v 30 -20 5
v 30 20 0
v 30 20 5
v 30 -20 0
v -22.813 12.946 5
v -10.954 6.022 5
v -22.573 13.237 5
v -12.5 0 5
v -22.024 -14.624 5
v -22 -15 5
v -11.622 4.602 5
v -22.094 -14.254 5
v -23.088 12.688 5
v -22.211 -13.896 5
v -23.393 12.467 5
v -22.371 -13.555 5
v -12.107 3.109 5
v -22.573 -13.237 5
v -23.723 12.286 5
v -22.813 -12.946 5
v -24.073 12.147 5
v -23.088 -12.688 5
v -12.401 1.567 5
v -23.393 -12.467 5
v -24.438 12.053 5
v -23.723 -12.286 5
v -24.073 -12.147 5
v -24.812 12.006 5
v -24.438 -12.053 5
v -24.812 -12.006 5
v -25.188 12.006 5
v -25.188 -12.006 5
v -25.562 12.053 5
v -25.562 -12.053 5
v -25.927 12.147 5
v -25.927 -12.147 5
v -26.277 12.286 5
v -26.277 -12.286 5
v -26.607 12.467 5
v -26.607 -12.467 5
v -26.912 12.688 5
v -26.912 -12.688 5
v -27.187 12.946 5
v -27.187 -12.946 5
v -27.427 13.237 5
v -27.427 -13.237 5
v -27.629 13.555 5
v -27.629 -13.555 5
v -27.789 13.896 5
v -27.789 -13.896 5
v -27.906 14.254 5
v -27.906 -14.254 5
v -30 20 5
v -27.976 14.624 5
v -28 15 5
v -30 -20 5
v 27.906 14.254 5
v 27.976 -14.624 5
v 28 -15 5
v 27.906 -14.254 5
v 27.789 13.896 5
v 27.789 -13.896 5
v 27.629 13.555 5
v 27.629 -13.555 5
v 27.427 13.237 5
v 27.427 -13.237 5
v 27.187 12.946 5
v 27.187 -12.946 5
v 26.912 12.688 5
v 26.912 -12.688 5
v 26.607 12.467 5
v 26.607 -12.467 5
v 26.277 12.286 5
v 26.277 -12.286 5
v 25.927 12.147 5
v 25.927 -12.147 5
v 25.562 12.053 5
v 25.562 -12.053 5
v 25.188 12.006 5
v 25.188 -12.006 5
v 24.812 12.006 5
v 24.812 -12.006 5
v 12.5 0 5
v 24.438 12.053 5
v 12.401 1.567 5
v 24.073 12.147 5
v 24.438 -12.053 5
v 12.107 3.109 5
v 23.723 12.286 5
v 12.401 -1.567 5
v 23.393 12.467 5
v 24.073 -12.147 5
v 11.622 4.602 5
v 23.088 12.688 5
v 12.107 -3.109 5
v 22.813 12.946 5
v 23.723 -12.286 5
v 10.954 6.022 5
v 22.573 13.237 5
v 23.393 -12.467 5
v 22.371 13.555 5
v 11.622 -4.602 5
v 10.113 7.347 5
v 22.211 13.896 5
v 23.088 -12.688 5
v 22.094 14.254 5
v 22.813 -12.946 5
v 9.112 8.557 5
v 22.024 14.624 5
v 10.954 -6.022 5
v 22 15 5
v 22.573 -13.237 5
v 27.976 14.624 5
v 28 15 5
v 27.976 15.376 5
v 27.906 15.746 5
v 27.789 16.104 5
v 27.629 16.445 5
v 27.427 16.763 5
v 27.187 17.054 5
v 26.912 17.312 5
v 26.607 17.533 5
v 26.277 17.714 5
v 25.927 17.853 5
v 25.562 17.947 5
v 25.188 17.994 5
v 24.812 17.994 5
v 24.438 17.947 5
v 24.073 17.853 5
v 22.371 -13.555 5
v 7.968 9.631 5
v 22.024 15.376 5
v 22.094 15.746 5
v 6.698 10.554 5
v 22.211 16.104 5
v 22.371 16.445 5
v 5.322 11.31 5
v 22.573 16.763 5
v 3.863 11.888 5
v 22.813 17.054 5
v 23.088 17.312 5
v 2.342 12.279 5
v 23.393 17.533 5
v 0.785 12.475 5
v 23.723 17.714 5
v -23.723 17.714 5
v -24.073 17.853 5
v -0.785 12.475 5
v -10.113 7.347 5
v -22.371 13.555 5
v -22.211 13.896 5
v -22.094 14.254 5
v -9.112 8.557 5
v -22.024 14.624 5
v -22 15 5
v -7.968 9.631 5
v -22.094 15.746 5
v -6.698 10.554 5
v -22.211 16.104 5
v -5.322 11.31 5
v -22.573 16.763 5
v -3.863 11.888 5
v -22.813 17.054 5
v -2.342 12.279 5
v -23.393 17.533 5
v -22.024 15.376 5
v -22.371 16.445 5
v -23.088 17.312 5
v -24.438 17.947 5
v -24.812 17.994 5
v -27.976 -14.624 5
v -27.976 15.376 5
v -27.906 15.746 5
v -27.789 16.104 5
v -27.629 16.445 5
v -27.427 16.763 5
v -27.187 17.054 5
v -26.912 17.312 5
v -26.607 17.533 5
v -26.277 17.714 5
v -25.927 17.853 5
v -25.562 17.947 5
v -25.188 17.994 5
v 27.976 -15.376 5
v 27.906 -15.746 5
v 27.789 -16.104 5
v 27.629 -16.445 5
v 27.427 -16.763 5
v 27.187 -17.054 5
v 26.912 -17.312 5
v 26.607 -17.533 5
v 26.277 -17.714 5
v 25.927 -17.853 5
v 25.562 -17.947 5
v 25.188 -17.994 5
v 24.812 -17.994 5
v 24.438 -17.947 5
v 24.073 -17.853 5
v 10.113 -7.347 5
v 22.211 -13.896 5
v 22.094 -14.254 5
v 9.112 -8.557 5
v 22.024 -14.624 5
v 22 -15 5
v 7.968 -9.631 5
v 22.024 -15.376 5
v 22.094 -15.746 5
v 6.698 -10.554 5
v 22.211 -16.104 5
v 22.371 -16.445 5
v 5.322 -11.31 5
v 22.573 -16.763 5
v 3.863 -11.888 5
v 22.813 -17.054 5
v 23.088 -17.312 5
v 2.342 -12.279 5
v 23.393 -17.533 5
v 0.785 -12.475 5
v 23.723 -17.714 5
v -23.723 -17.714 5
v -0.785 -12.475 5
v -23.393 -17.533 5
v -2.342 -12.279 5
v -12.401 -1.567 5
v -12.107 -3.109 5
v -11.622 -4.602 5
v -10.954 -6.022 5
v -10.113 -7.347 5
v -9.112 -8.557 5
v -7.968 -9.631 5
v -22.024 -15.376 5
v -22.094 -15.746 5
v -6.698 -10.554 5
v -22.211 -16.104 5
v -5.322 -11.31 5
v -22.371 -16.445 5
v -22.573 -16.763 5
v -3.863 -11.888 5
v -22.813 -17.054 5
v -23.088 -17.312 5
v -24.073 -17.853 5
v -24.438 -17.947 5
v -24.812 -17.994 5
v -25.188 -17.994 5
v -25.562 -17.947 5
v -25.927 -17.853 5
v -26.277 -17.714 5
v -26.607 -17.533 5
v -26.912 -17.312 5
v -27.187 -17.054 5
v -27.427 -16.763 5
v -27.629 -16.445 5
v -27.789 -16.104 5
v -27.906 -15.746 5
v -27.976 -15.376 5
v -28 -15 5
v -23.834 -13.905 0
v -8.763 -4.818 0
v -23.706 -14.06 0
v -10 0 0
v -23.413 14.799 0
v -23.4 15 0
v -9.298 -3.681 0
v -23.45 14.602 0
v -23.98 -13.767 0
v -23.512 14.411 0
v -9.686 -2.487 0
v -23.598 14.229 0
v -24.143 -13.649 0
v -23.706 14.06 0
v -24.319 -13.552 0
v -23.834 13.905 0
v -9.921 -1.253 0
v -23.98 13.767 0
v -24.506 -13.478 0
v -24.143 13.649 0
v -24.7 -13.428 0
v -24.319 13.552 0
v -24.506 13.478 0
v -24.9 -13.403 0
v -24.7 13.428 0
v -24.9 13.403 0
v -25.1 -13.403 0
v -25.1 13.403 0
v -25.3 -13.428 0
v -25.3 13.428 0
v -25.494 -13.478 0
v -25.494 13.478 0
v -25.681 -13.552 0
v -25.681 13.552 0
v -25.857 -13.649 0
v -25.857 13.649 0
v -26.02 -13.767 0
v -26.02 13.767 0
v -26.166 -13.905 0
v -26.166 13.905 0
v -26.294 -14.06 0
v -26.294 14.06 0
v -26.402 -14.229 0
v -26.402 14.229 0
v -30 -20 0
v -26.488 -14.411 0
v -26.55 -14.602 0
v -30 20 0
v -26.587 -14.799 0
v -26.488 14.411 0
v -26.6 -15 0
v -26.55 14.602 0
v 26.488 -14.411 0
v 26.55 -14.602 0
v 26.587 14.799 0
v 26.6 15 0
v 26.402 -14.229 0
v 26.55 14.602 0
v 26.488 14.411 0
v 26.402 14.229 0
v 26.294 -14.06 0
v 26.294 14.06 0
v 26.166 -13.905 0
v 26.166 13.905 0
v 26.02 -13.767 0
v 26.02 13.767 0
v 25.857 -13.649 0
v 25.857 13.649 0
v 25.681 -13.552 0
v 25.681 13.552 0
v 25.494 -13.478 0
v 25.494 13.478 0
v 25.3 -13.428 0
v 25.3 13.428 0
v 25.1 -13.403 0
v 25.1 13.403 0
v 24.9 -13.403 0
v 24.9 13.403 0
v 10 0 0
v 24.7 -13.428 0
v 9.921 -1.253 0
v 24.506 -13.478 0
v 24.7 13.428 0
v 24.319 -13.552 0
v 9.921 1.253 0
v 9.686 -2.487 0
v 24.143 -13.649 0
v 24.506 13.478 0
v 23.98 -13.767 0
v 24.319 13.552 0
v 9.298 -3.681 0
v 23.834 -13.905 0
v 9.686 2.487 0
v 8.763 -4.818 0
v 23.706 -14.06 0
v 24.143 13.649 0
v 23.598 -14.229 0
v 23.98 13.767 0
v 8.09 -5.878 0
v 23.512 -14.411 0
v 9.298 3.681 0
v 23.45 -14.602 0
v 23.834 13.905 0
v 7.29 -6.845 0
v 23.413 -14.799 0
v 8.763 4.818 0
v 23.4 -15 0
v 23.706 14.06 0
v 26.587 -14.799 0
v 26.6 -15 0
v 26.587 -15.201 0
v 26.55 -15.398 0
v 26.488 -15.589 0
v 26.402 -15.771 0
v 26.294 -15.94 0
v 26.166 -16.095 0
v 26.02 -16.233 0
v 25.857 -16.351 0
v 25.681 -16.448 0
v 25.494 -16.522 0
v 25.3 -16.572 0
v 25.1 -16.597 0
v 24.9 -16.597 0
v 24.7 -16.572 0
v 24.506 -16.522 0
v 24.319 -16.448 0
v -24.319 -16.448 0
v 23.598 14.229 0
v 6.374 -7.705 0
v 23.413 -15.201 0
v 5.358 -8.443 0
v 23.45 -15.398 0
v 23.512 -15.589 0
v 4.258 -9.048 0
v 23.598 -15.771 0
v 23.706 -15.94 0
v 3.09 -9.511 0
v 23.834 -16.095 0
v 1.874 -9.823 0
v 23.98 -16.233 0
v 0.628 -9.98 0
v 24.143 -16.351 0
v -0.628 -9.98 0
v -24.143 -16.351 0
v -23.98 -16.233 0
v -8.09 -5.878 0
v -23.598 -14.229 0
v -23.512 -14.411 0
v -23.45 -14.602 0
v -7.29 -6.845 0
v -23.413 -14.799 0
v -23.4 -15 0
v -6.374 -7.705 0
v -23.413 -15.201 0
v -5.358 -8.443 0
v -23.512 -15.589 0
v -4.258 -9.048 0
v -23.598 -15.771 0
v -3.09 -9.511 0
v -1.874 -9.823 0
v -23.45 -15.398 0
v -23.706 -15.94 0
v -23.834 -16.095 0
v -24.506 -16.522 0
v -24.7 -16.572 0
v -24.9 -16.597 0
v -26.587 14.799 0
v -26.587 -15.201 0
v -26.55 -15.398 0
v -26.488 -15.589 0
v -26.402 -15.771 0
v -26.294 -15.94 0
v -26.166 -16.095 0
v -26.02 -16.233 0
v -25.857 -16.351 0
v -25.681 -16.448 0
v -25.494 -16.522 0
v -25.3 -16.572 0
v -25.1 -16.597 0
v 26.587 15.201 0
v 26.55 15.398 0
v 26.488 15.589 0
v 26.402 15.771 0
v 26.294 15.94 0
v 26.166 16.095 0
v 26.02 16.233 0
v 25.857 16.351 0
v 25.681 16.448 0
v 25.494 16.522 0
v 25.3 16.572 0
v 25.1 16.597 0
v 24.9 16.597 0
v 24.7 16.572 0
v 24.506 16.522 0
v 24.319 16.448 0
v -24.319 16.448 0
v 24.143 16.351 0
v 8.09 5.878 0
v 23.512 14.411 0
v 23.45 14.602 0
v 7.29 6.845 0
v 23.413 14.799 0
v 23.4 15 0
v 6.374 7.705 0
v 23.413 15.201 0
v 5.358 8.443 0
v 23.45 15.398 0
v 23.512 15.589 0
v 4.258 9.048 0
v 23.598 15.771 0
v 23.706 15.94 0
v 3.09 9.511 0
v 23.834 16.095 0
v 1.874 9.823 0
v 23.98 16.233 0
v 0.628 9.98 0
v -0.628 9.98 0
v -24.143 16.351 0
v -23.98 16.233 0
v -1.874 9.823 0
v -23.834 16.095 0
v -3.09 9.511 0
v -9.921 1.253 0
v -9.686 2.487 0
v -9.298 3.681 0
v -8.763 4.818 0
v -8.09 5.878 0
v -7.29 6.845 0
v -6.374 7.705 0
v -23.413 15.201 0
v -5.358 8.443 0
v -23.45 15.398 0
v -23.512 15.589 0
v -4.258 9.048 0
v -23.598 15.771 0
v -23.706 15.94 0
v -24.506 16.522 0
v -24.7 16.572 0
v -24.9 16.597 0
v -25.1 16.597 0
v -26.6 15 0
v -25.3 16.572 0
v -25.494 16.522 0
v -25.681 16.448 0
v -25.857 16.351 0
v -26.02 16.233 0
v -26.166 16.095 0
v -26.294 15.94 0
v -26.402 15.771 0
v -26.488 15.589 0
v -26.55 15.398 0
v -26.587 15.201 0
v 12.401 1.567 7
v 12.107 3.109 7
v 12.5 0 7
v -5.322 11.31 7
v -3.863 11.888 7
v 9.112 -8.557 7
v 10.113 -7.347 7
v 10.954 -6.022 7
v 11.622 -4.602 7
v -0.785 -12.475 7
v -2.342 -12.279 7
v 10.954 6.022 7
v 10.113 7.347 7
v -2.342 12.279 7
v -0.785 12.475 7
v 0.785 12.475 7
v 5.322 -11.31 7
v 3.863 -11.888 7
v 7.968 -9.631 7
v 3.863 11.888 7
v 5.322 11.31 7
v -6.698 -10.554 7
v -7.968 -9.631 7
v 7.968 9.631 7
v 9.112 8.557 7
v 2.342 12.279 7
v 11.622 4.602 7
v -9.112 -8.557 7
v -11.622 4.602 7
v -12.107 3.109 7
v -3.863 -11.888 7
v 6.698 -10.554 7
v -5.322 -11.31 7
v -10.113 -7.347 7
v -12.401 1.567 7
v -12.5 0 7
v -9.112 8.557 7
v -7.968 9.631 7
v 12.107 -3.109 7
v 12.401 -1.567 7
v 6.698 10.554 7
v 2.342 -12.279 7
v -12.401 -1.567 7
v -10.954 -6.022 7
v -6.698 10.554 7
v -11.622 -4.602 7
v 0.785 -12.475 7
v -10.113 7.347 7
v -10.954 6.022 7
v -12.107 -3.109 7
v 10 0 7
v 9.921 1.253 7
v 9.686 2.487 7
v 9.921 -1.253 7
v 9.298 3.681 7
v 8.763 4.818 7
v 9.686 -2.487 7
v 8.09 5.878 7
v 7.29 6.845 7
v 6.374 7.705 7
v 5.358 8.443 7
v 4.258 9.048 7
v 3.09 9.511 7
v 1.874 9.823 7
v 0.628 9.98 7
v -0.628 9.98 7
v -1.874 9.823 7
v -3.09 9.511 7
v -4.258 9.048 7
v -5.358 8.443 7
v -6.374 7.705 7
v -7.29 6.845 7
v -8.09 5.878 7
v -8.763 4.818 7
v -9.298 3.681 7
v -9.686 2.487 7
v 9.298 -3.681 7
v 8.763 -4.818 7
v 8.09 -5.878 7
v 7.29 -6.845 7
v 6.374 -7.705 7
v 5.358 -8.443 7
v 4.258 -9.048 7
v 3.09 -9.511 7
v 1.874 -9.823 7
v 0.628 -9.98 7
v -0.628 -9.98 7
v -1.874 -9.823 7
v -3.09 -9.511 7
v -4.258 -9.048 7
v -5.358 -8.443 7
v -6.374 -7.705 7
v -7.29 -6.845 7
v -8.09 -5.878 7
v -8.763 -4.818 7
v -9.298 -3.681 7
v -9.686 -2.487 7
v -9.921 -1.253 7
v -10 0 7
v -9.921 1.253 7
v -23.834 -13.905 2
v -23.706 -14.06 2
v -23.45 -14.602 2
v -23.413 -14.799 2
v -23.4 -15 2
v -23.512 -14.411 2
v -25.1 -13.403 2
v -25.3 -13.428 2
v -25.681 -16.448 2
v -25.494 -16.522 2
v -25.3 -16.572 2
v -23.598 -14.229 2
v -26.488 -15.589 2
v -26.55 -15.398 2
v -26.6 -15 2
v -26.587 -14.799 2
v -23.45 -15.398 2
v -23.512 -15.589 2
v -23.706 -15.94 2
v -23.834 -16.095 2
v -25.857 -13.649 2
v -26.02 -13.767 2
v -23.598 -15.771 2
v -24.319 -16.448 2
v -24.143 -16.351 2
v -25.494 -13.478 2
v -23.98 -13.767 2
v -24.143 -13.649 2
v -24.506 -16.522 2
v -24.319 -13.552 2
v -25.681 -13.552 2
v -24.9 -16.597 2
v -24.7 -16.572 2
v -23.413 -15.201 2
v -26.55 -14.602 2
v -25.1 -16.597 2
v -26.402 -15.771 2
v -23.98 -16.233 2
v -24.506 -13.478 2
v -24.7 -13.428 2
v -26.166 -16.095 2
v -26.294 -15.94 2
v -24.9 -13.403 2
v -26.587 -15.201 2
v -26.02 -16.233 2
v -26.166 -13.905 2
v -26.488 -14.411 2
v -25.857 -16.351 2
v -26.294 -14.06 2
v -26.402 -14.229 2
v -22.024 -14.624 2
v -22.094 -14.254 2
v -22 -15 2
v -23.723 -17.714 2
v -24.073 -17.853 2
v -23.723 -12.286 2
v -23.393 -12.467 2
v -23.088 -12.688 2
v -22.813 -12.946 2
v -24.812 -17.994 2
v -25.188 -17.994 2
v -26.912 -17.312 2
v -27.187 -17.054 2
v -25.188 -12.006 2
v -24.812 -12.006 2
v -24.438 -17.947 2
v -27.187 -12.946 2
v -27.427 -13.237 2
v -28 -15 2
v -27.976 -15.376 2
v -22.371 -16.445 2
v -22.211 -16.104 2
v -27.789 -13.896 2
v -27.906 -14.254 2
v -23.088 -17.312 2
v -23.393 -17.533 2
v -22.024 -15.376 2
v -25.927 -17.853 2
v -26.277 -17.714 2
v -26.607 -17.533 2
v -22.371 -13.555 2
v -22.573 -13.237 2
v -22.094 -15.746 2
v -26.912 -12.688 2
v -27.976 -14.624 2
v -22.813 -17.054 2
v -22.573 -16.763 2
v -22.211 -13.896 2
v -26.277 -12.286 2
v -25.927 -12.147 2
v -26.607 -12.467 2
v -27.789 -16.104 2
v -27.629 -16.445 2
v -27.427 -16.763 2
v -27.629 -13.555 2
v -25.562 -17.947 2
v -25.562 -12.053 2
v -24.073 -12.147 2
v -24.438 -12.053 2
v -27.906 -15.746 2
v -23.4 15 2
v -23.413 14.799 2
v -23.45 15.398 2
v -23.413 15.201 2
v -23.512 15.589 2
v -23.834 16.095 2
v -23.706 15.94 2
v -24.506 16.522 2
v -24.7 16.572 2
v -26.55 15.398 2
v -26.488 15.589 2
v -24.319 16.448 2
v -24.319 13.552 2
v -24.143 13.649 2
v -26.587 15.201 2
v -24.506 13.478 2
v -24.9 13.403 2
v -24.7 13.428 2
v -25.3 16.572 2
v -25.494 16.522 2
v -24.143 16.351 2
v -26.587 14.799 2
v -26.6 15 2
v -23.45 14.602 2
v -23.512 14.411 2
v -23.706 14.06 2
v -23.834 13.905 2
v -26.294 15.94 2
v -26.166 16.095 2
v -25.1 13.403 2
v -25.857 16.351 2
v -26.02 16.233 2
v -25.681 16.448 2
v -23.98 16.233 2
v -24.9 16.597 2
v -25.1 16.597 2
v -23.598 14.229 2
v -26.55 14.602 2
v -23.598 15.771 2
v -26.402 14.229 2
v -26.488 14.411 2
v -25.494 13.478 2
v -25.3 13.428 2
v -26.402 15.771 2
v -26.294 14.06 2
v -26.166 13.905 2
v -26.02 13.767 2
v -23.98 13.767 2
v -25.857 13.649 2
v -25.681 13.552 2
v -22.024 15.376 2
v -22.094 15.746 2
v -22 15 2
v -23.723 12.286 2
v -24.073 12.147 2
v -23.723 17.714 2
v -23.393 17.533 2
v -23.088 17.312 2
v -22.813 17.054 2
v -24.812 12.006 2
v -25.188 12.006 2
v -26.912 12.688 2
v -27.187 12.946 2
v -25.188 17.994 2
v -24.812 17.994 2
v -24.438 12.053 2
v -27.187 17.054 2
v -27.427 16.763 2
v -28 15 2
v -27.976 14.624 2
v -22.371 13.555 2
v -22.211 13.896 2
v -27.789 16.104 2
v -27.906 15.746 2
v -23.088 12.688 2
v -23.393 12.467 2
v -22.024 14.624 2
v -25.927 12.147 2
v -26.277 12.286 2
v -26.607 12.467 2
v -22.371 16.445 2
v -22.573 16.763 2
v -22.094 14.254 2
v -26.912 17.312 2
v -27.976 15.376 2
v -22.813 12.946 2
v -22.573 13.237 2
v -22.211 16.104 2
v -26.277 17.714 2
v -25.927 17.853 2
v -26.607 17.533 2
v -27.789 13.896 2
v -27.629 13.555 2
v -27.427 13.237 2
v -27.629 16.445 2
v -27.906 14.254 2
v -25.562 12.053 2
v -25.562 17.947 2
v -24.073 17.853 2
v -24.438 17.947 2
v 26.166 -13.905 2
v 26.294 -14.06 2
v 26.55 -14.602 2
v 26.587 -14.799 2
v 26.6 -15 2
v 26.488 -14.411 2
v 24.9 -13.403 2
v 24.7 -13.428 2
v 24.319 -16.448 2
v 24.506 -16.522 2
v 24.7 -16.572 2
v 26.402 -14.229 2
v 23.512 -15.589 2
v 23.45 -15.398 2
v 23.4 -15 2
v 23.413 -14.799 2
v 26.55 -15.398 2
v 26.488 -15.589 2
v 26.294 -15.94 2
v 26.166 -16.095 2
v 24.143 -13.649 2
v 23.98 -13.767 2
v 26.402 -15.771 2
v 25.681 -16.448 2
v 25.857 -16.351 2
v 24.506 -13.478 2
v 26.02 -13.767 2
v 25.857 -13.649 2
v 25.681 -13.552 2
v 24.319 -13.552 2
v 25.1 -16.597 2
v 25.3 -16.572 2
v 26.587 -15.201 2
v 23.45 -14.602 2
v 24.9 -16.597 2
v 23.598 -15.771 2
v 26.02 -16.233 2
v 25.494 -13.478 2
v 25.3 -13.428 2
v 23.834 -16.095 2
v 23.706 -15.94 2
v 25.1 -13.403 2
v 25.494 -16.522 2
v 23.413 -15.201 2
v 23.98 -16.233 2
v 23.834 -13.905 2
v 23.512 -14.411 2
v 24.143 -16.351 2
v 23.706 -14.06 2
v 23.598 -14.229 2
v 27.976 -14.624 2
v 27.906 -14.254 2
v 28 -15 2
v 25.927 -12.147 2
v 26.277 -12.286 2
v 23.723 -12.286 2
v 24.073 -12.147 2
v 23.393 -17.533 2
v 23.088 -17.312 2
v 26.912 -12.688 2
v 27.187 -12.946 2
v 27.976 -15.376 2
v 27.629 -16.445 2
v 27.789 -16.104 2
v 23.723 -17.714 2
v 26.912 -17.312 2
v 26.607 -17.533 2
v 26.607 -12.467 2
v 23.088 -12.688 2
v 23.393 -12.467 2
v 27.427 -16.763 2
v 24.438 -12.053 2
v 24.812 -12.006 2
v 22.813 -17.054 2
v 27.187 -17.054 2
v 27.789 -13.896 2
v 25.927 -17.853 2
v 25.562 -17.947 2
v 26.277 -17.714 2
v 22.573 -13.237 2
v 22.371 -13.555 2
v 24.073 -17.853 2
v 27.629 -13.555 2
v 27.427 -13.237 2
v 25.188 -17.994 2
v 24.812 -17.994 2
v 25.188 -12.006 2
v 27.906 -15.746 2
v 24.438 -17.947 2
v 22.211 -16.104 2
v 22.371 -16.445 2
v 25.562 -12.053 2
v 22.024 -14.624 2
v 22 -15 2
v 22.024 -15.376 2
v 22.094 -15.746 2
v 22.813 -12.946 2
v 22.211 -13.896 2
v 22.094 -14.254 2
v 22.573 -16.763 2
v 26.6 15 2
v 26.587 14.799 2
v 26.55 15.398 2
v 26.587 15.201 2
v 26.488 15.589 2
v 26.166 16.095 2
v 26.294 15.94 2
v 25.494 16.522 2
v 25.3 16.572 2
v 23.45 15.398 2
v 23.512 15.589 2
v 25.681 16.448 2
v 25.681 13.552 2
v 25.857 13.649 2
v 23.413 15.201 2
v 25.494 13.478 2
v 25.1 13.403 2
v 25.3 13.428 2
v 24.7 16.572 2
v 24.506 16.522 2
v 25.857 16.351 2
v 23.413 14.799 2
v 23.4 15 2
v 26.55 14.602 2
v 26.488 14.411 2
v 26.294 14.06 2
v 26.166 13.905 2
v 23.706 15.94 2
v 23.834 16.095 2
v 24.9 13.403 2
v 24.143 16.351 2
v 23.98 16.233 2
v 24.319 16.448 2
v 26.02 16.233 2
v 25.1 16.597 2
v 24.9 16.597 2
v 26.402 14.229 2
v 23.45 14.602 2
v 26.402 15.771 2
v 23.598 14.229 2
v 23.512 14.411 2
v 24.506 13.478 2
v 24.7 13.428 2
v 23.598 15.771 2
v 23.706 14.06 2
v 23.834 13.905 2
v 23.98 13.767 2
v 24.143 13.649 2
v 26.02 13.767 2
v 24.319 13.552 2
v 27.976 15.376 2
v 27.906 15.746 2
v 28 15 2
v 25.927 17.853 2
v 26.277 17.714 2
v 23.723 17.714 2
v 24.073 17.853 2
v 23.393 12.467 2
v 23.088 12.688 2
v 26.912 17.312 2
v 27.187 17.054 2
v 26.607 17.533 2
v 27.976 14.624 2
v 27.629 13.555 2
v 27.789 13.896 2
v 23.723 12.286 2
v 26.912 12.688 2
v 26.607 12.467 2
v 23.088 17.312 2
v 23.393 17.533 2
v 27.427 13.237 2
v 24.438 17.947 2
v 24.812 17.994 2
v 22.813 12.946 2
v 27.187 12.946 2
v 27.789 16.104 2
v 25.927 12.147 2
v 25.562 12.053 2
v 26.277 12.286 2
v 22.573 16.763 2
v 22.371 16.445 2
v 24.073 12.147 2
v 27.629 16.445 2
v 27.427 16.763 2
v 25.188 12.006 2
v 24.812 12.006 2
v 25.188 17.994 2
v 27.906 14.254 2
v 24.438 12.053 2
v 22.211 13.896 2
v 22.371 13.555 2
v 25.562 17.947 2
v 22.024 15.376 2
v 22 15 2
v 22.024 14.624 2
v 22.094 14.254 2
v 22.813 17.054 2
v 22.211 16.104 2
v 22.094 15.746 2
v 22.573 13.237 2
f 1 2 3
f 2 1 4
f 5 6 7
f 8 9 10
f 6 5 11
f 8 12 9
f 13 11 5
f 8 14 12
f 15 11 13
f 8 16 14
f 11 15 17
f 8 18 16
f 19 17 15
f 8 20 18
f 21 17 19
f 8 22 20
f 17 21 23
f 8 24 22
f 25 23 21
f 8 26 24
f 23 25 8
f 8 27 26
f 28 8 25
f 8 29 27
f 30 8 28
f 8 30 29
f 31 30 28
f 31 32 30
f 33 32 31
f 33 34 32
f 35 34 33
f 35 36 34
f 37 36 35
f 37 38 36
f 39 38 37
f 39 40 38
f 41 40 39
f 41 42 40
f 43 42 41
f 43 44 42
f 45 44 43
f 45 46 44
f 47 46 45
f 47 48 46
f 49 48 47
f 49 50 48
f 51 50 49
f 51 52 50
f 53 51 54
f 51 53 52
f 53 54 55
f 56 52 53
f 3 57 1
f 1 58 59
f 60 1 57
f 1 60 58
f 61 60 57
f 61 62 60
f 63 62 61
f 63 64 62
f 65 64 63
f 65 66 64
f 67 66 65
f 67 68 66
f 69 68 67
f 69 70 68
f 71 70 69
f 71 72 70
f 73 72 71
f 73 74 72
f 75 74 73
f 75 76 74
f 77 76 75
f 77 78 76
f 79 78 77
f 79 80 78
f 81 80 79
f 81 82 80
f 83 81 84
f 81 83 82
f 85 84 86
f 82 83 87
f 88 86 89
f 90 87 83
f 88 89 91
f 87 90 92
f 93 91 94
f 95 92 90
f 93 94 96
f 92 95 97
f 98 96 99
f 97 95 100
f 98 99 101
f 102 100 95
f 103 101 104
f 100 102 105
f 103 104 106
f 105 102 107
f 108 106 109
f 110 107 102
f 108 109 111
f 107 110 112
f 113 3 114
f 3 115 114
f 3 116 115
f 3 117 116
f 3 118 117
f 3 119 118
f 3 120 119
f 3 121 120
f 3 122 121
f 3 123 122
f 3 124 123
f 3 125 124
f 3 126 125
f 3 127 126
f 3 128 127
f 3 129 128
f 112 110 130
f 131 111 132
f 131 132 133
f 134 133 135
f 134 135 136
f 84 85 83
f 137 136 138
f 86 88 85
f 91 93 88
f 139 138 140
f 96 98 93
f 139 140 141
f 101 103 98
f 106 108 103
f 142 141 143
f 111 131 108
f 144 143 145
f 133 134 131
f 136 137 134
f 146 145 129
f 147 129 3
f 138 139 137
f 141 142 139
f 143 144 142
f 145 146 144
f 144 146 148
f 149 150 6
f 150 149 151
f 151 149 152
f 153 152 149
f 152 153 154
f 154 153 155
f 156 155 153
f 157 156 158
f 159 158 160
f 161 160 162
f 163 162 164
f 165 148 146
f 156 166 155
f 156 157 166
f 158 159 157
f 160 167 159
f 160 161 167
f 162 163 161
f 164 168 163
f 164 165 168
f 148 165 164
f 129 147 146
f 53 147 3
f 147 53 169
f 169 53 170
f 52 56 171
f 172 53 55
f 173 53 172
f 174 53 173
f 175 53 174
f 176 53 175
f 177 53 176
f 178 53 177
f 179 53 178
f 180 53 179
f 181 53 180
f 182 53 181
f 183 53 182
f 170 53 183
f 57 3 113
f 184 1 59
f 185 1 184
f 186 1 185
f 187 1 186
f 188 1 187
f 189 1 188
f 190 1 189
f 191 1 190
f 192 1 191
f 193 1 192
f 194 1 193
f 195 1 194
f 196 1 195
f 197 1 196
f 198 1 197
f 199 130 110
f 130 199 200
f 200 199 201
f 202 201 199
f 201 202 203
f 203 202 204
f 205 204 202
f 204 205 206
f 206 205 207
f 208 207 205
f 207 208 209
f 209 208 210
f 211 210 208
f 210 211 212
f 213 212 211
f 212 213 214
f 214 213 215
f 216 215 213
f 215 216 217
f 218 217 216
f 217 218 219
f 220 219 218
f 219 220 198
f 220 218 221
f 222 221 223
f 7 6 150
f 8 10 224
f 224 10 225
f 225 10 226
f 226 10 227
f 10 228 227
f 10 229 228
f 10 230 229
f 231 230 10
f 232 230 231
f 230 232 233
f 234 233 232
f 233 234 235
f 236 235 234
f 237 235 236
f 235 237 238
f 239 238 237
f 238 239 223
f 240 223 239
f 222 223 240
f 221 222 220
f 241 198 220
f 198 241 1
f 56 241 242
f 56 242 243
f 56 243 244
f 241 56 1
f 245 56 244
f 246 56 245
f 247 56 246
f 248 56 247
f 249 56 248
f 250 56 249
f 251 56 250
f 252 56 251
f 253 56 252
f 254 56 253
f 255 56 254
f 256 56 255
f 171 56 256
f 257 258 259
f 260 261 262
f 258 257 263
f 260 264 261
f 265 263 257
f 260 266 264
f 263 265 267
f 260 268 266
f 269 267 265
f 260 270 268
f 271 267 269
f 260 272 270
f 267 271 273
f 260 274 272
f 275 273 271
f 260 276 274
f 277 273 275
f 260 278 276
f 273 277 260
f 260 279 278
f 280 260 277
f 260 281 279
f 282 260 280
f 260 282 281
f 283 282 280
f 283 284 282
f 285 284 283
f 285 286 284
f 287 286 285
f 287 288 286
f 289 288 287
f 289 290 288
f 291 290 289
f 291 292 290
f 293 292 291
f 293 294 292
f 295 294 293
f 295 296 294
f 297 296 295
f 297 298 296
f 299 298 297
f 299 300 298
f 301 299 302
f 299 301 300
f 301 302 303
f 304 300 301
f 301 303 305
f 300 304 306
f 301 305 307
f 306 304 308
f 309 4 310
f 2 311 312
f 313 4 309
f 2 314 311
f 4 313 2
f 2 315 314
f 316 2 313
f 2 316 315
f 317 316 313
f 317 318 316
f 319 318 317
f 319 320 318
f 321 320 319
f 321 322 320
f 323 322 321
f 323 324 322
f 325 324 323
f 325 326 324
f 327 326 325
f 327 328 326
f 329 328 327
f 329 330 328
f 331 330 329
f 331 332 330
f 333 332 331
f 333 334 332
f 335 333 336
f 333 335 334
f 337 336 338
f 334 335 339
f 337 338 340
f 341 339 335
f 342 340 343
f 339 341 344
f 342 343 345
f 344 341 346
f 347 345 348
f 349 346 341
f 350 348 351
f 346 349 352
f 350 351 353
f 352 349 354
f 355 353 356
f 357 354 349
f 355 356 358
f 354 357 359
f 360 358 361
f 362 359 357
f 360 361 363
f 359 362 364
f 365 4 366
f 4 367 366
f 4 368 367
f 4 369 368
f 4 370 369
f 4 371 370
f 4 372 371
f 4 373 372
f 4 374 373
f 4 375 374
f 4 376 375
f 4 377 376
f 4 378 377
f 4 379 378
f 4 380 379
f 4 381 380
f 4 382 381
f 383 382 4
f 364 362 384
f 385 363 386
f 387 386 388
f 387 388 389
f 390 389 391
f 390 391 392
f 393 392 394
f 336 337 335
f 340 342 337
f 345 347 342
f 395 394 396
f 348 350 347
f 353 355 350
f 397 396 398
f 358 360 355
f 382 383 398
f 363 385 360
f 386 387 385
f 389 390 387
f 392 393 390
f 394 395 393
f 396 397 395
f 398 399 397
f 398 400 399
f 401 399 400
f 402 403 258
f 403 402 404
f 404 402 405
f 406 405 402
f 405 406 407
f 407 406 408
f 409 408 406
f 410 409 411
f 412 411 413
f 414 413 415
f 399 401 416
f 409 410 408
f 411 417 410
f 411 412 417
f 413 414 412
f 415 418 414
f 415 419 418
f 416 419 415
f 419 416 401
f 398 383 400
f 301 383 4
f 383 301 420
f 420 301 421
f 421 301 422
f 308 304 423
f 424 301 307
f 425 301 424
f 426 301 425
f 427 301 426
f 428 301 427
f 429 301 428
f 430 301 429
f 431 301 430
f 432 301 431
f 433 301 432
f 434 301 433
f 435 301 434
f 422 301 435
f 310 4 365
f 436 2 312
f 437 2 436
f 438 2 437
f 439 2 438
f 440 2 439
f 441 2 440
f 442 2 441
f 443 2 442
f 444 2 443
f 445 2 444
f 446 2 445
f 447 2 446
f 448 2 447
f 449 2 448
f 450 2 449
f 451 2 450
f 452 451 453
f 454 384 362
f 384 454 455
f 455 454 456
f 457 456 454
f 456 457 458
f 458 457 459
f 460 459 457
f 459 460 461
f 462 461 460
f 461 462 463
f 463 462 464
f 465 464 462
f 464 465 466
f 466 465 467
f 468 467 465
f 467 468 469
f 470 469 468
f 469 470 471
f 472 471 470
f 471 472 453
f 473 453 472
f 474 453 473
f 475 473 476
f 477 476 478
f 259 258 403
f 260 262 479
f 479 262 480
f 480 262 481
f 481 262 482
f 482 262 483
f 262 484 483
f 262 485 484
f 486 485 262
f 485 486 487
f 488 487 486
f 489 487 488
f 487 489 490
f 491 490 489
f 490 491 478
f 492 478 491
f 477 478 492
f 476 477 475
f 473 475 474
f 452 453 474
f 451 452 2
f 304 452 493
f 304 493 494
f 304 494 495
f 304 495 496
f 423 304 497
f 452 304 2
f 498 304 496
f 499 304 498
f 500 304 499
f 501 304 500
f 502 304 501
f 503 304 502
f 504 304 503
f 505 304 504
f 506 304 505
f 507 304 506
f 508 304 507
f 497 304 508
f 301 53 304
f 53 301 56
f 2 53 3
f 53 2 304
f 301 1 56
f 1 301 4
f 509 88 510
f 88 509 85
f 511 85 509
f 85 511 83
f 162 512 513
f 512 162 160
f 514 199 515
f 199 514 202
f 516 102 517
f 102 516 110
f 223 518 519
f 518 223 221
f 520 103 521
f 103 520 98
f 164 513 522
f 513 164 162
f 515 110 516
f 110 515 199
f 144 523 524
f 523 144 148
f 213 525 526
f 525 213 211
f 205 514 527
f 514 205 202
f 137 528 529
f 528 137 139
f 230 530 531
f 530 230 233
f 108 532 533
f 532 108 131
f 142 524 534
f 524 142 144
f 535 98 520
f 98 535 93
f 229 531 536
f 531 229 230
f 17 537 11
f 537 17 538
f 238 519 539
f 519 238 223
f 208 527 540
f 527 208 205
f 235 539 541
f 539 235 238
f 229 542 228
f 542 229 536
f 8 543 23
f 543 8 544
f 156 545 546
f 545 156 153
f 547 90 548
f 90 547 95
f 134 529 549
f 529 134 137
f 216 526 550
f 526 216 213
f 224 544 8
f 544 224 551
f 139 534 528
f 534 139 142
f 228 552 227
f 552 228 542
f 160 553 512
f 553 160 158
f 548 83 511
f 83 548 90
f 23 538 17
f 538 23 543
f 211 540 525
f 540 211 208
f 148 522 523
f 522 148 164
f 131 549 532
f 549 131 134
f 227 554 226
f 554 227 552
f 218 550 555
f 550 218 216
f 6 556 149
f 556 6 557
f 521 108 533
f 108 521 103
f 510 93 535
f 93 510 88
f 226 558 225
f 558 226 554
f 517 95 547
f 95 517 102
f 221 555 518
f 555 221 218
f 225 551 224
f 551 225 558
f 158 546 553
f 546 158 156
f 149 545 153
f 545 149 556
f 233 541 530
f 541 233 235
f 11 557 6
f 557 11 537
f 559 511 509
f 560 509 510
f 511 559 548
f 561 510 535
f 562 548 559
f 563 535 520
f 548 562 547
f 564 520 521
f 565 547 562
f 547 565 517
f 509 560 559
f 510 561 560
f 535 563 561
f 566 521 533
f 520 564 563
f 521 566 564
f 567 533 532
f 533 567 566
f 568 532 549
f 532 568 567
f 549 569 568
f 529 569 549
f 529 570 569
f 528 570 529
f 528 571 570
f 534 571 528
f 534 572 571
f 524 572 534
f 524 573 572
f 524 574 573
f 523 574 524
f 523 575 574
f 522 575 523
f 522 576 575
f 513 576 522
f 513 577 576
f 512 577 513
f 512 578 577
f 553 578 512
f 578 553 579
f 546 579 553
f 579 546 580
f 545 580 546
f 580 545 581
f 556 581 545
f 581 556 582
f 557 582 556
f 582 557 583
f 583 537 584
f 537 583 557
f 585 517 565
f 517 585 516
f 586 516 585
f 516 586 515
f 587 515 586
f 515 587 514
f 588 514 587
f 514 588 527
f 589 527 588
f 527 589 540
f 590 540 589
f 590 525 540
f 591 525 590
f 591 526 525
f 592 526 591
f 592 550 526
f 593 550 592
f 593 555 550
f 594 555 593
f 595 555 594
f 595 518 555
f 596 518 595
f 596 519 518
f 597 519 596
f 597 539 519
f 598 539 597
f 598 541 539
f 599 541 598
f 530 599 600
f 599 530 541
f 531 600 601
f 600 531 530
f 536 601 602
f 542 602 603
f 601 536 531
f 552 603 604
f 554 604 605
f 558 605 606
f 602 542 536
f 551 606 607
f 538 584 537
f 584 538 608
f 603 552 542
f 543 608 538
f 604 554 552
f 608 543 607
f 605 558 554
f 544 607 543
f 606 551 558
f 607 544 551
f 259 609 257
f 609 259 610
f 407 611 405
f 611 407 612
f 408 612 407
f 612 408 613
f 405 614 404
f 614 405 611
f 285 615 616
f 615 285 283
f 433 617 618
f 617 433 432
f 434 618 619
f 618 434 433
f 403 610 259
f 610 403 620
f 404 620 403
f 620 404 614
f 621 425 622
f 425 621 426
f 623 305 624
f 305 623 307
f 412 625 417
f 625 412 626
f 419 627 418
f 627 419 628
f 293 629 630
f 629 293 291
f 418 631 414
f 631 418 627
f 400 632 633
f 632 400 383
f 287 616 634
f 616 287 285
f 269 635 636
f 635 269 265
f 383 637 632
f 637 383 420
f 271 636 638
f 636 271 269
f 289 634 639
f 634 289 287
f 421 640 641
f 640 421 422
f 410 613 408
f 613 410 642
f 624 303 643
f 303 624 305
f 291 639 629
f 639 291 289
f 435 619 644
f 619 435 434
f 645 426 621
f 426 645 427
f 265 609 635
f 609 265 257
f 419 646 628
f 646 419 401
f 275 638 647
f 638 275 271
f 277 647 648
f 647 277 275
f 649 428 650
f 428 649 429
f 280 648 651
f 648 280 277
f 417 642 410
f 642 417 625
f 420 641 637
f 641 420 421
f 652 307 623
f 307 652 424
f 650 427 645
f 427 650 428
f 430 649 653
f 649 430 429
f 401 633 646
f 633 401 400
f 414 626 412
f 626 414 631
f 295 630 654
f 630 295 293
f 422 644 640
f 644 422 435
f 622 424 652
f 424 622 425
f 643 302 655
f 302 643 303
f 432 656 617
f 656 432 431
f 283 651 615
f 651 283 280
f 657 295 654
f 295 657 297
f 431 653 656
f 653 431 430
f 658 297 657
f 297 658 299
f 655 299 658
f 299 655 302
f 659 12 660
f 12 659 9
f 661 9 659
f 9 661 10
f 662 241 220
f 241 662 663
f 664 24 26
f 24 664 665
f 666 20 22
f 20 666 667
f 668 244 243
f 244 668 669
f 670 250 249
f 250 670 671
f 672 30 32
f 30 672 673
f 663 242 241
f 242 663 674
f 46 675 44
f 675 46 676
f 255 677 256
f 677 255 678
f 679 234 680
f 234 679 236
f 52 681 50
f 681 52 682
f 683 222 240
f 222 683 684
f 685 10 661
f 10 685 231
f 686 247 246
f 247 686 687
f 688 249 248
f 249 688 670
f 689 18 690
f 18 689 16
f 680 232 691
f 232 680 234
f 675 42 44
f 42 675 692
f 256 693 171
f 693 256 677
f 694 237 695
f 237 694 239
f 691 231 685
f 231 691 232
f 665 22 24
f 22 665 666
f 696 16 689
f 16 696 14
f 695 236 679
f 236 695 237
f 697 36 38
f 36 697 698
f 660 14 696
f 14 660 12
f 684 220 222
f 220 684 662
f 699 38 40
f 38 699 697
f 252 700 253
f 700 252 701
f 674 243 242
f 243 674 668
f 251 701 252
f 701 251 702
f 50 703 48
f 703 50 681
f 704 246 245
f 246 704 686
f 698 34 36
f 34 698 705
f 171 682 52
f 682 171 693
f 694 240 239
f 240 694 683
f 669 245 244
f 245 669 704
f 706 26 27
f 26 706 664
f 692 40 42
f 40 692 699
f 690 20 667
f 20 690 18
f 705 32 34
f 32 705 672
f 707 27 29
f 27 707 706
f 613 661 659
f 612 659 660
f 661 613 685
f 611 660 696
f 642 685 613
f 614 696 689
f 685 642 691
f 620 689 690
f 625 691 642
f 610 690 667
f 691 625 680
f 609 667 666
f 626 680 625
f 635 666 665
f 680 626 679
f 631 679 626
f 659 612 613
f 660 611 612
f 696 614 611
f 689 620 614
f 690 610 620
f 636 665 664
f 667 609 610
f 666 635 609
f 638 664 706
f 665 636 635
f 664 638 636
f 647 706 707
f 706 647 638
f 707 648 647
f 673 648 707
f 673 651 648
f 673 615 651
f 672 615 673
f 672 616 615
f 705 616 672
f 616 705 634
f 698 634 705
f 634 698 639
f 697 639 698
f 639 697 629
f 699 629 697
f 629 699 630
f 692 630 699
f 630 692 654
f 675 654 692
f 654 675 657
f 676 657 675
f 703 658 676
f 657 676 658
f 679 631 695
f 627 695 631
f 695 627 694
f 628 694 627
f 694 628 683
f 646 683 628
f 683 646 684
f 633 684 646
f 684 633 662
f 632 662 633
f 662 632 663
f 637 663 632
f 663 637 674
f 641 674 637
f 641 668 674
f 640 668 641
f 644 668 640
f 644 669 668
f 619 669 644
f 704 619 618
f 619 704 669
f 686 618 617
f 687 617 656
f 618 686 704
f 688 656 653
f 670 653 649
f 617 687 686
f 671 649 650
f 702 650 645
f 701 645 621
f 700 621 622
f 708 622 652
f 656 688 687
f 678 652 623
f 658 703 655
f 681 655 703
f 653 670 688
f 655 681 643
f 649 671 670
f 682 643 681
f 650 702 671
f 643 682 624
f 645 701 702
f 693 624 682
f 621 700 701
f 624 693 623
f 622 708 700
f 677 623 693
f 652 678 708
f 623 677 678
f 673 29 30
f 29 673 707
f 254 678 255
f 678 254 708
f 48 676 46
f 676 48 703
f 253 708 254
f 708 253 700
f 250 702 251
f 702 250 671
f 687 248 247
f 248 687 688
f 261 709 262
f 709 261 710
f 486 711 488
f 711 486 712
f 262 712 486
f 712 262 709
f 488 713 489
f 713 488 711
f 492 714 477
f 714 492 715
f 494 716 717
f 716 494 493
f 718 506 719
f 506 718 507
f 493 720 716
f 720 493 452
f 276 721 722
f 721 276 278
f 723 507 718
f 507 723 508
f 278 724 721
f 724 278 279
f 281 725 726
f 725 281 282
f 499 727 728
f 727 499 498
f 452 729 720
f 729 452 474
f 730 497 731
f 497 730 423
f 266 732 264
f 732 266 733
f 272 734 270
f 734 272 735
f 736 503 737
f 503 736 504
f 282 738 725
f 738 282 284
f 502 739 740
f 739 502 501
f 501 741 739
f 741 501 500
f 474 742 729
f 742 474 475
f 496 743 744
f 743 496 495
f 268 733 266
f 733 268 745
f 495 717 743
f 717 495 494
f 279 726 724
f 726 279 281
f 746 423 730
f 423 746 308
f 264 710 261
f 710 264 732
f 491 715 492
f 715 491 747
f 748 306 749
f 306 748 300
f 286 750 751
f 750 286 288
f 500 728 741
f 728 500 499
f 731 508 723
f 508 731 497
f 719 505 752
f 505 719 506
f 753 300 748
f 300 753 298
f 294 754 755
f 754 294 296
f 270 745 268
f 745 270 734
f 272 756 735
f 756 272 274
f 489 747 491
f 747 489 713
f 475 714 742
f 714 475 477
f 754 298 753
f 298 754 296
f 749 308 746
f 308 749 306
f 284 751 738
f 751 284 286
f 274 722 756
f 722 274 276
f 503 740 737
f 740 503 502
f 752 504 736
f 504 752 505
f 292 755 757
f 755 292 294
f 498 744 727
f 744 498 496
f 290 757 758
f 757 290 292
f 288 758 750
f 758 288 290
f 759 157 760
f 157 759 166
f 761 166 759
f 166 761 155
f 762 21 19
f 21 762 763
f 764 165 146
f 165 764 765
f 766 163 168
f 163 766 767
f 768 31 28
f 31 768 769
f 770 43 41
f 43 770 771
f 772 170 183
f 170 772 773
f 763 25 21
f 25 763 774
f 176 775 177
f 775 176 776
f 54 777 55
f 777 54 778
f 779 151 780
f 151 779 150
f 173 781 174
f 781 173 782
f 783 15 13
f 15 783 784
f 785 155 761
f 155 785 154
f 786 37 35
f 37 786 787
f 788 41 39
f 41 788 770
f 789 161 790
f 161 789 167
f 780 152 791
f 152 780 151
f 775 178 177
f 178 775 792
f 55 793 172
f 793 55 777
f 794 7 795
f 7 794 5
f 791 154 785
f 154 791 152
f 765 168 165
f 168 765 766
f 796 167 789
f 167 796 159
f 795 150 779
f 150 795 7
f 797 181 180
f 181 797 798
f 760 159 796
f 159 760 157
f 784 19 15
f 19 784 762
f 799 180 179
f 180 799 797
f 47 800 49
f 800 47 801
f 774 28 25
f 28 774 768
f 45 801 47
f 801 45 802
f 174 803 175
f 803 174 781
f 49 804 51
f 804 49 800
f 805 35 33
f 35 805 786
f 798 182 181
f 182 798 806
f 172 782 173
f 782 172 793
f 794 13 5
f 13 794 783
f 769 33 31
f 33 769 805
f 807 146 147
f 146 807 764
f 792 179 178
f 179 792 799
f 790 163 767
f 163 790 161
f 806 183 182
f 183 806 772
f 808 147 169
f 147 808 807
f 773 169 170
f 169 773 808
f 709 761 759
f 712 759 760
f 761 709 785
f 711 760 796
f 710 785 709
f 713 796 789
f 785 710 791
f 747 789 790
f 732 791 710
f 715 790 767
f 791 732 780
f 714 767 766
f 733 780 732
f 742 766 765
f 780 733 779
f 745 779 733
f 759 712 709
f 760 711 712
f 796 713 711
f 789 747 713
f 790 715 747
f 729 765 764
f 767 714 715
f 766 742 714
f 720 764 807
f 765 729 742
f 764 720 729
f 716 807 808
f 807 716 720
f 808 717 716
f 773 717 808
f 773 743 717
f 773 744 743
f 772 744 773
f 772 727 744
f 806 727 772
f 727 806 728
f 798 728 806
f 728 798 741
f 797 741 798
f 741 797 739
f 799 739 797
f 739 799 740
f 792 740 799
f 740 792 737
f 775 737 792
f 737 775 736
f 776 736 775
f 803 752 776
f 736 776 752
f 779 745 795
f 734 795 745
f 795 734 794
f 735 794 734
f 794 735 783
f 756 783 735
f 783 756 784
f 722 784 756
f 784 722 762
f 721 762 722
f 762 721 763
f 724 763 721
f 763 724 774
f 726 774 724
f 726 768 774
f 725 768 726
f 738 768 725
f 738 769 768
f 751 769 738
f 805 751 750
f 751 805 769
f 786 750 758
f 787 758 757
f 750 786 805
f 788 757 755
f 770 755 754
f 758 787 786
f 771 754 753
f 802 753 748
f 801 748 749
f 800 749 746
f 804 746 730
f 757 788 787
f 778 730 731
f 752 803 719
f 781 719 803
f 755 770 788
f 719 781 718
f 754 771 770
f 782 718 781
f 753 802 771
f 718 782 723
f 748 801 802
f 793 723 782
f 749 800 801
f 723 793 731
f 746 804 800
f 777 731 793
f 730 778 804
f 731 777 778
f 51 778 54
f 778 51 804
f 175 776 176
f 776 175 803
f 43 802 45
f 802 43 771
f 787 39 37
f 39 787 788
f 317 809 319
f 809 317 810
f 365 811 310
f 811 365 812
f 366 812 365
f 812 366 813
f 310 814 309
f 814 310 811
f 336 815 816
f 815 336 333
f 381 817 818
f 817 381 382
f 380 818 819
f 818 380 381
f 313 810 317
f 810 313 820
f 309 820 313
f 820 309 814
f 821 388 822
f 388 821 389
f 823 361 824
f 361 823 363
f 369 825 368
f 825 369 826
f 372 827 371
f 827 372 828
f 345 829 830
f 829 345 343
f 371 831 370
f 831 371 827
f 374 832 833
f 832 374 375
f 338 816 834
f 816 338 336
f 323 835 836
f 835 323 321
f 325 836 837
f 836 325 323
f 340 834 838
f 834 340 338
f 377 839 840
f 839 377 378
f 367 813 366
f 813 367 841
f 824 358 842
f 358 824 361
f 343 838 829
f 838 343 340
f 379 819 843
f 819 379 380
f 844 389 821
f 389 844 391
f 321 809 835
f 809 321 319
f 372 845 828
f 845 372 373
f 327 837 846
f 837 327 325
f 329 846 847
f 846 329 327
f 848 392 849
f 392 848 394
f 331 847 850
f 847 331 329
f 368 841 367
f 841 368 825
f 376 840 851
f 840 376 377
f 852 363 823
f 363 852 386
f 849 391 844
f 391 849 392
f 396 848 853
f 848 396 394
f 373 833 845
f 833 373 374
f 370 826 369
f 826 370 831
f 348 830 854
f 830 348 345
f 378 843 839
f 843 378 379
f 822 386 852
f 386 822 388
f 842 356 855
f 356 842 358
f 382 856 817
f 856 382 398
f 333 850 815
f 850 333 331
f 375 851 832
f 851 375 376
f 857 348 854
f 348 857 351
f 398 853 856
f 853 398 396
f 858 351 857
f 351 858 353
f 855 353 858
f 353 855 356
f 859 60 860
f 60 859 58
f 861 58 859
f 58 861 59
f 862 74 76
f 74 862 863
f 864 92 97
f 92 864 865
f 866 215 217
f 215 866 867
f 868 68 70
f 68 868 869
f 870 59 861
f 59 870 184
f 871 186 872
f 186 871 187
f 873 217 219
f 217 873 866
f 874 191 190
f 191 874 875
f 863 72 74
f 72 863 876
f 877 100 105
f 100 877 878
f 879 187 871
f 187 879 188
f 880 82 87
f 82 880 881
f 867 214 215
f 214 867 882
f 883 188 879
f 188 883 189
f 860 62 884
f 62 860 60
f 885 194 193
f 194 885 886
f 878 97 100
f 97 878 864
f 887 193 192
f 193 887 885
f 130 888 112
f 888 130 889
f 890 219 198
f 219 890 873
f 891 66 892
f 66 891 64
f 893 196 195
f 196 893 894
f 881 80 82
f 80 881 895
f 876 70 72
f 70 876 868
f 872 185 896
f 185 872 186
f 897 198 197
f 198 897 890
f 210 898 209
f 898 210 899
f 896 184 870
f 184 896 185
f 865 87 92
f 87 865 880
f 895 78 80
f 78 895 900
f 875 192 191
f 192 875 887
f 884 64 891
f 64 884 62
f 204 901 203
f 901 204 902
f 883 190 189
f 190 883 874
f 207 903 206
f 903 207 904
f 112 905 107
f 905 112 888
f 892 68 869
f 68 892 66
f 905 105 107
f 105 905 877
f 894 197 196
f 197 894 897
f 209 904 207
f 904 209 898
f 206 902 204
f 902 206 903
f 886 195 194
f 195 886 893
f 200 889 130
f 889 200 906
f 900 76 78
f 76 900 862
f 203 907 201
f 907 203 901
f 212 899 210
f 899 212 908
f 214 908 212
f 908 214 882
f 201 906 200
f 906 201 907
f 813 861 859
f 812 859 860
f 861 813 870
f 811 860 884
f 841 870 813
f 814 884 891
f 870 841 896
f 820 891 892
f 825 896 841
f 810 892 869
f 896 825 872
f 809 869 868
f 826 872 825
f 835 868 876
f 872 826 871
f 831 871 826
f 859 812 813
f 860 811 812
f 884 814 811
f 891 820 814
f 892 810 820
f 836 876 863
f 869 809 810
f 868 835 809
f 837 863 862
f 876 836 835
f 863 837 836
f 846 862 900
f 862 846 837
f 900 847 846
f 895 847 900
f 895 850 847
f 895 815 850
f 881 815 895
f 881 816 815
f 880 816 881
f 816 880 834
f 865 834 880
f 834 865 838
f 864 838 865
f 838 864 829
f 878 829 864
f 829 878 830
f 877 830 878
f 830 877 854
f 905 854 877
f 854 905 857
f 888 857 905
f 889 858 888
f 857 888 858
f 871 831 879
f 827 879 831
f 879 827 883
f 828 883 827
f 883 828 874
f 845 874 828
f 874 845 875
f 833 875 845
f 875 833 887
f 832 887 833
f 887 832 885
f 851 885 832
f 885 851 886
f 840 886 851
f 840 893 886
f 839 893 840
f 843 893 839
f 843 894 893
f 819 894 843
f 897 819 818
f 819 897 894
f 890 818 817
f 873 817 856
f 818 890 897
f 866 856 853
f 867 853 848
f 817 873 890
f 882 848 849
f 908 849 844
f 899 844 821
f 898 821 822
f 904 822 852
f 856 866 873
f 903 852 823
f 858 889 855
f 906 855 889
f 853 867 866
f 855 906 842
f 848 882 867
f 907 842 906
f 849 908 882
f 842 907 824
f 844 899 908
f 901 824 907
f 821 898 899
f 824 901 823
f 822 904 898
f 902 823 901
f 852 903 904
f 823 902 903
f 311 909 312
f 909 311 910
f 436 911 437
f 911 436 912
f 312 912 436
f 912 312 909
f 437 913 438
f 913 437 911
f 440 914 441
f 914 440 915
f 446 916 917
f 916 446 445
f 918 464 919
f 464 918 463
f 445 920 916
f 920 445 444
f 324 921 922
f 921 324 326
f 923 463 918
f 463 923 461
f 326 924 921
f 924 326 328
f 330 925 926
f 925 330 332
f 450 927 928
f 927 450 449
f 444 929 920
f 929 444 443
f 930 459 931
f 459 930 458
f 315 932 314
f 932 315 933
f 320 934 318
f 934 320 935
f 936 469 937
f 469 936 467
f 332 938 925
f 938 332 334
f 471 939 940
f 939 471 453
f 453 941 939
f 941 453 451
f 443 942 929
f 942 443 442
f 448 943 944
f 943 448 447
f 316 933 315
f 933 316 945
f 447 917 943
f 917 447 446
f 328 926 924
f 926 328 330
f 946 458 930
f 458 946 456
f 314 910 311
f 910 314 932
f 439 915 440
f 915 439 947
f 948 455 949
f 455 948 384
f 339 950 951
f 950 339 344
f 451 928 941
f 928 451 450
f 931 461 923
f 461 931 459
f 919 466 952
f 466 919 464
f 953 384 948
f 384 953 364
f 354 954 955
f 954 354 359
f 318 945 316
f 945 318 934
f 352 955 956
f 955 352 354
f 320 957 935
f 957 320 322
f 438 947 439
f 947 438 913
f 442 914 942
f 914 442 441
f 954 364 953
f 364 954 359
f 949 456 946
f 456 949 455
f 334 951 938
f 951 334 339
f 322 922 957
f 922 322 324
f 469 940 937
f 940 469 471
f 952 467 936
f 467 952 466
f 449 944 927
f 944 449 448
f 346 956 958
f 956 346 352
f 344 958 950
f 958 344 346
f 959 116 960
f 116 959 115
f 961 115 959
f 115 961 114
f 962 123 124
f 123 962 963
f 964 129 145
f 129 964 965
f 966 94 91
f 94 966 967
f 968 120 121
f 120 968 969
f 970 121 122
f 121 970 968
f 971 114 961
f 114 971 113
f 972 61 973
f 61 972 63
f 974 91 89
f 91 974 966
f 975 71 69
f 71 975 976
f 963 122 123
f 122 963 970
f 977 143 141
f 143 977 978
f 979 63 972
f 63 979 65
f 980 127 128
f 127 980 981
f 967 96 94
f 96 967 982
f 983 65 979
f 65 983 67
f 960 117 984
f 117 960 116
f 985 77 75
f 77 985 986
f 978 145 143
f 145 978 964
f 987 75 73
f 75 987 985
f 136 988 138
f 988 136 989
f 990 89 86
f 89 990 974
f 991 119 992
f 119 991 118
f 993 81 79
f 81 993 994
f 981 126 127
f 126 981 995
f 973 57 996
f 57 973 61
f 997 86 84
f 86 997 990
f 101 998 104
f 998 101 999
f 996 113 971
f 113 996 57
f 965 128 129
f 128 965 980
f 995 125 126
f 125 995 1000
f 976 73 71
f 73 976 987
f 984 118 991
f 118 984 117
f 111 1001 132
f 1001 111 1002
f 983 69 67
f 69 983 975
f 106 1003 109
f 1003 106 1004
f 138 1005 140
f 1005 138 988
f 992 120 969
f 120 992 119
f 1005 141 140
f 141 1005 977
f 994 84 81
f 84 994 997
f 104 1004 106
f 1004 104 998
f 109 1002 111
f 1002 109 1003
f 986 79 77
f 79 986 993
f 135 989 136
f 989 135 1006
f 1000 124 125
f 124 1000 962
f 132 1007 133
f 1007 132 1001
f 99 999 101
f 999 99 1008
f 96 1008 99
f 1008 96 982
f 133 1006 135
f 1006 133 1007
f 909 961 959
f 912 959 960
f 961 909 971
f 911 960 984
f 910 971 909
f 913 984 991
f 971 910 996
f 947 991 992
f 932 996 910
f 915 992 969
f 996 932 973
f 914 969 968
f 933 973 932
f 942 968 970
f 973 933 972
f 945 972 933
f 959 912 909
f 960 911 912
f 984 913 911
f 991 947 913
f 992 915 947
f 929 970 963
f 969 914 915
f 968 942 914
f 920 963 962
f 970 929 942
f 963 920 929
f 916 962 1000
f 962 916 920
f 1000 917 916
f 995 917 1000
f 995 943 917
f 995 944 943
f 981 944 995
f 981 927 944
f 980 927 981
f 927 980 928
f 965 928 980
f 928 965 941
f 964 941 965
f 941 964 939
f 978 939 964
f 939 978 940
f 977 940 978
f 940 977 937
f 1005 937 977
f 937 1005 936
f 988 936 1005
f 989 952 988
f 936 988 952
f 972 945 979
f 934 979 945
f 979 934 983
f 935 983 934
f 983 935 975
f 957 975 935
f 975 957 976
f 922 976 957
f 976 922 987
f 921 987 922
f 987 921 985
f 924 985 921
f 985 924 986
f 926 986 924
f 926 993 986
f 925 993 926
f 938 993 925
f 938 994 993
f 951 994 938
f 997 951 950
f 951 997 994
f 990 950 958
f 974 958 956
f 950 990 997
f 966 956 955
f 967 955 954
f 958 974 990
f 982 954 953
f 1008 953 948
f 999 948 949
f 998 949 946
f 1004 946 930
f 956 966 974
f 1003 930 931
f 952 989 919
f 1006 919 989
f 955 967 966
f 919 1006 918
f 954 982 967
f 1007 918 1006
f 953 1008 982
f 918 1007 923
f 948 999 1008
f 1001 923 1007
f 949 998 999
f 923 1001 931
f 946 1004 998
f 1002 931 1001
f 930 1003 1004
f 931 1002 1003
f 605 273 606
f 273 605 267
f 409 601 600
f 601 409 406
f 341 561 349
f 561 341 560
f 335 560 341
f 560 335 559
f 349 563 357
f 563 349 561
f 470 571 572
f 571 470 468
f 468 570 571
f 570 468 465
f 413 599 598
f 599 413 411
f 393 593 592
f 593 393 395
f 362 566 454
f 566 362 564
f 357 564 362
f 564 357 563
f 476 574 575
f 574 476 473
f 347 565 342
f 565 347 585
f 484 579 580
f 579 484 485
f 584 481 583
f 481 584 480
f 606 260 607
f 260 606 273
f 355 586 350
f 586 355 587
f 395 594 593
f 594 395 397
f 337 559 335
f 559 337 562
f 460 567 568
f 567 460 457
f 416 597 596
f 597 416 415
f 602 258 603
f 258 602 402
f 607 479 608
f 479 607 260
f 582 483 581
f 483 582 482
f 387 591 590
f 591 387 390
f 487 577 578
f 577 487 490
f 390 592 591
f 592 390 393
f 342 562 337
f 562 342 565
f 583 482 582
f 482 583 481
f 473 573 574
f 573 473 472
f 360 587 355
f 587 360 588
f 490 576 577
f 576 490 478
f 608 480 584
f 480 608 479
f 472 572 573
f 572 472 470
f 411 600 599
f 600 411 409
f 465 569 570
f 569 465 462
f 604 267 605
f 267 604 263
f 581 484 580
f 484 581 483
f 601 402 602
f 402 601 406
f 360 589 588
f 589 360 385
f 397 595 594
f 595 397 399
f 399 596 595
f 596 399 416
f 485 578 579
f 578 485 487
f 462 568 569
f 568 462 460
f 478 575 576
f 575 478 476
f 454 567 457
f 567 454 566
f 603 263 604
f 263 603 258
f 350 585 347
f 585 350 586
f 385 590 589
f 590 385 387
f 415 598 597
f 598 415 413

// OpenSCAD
// Turn 1 edit: fix hole spacing (D2) and add counterbores (D3).
// Leaving bore_dia unchanged pending dimensional verification.

$fn = 50;

plate_w = 60;
plate_d = 40;
plate_t = 5;

bore_dia = 20;    // FIXED: was 22 (caught by pixel measurement, not eyeball)

boss_dia = 25;
boss_h   = 2;

hole_dia     = 3.2;
hole_dx      = 50;   // FIXED: was 60
hole_dy      = 30;

cbore_dia    = 6;    // ADDED
cbore_depth  = 3;    // ADDED

module motor_mount() {
    difference() {
        union() {
            translate([-plate_w/2, -plate_d/2, 0])
                cube([plate_w, plate_d, plate_t]);
            translate([0, 0, plate_t])
                cylinder(h = boss_h, d = boss_dia);
        }
        translate([0, 0, -0.5])
            cylinder(h = plate_t + boss_h + 1, d = bore_dia);
        for (x = [-hole_dx/2, hole_dx/2])
            for (y = [-hole_dy/2, hole_dy/2]) {
                translate([x, y, -0.5])
                    cylinder(h = plate_t + 1, d = hole_dia);
                translate([x, y, plate_t - cbore_depth])
                    cylinder(h = cbore_depth + 0.5, d = cbore_dia);
            }
    }
}

motor_mount();
